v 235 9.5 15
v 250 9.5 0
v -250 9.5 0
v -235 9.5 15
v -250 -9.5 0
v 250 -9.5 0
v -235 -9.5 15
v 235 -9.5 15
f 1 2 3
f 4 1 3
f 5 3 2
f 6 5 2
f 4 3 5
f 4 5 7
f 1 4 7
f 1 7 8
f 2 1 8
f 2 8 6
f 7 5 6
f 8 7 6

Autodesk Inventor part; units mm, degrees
ref_plane "YZ Plane" through (0, 0, 0) normal (1, 0, 0) x (0, 1, 0)
ref_plane "XZ Plane" through (0, 0, 0) normal (0, 1, 0) x (-1, 0, 0)
ref_plane "XY Plane" through (0, 0, 0) normal (0, 0, 1) x (1, 0, 0)
sketch "Sketch1" plane through (0, 0, 0) normal (0, 0, 1) x (1, 0, 0)
  line L0 (250, 9.5) -> (-250, 9.5)
  line L1 (-250, 9.5) -> (-250, -9.5)
  line L2 (-250, -9.5) -> (250, -9.5)
  line L3 (250, -9.5) -> (250, 9.5)
  line L4 (250, 9.5) -> (-250, -9.5) construction
  line L5 (-250, 9.5) -> (250, -9.5) construction
  point P0 (0, 0)
  dimension "d0" = 500
  dimension "d1" = 19
extrude "Extrusion1" add sketch "Sketch1" along normal blind 15
sketch "Sketch2" plane through (-250, 9.5, 0) normal (0, 1, 0) x (1, 0, 0)
  line L0 (0, 0) -> (0, -15) projected
  line L1 (0, 0) -> (15, -15)
  line L2 (0, -15) -> (500, -15) projected
  line L3 (0, 0) -> (0, -15)
  line L4 (15, -15) -> (0, -15)
  point P0 (250, 0)
  dimension "d5" = 45
extrude "Extrusion2" cut sketch "Sketch2" against normal through all
mirror "Mirror1" about plane through (0, 0, 0) normal (1, 0, 0) of "Extrusion2"
ref_plane "Work Plane1" through (0, 0, 0) normal (1, 0, 0) x (0, 1, 0)
properties part number "widthBinding"
